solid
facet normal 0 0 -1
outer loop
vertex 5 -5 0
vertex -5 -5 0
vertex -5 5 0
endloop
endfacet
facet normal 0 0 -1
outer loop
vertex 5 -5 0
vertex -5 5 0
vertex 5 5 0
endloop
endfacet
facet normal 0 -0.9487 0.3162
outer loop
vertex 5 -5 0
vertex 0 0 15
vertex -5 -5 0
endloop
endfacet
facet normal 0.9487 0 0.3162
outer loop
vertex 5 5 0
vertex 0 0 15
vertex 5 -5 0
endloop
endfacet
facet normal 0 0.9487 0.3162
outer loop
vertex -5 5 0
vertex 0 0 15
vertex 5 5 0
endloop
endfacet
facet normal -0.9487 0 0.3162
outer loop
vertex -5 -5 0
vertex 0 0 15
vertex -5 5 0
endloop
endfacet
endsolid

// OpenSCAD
// Simple pyramid test model for 3dmake tests
module pyramid(size = 10, height = 15) {
    linear_extrude(height = height, scale = 0) {
        square(size, center = true);
    }
}

pyramid();
